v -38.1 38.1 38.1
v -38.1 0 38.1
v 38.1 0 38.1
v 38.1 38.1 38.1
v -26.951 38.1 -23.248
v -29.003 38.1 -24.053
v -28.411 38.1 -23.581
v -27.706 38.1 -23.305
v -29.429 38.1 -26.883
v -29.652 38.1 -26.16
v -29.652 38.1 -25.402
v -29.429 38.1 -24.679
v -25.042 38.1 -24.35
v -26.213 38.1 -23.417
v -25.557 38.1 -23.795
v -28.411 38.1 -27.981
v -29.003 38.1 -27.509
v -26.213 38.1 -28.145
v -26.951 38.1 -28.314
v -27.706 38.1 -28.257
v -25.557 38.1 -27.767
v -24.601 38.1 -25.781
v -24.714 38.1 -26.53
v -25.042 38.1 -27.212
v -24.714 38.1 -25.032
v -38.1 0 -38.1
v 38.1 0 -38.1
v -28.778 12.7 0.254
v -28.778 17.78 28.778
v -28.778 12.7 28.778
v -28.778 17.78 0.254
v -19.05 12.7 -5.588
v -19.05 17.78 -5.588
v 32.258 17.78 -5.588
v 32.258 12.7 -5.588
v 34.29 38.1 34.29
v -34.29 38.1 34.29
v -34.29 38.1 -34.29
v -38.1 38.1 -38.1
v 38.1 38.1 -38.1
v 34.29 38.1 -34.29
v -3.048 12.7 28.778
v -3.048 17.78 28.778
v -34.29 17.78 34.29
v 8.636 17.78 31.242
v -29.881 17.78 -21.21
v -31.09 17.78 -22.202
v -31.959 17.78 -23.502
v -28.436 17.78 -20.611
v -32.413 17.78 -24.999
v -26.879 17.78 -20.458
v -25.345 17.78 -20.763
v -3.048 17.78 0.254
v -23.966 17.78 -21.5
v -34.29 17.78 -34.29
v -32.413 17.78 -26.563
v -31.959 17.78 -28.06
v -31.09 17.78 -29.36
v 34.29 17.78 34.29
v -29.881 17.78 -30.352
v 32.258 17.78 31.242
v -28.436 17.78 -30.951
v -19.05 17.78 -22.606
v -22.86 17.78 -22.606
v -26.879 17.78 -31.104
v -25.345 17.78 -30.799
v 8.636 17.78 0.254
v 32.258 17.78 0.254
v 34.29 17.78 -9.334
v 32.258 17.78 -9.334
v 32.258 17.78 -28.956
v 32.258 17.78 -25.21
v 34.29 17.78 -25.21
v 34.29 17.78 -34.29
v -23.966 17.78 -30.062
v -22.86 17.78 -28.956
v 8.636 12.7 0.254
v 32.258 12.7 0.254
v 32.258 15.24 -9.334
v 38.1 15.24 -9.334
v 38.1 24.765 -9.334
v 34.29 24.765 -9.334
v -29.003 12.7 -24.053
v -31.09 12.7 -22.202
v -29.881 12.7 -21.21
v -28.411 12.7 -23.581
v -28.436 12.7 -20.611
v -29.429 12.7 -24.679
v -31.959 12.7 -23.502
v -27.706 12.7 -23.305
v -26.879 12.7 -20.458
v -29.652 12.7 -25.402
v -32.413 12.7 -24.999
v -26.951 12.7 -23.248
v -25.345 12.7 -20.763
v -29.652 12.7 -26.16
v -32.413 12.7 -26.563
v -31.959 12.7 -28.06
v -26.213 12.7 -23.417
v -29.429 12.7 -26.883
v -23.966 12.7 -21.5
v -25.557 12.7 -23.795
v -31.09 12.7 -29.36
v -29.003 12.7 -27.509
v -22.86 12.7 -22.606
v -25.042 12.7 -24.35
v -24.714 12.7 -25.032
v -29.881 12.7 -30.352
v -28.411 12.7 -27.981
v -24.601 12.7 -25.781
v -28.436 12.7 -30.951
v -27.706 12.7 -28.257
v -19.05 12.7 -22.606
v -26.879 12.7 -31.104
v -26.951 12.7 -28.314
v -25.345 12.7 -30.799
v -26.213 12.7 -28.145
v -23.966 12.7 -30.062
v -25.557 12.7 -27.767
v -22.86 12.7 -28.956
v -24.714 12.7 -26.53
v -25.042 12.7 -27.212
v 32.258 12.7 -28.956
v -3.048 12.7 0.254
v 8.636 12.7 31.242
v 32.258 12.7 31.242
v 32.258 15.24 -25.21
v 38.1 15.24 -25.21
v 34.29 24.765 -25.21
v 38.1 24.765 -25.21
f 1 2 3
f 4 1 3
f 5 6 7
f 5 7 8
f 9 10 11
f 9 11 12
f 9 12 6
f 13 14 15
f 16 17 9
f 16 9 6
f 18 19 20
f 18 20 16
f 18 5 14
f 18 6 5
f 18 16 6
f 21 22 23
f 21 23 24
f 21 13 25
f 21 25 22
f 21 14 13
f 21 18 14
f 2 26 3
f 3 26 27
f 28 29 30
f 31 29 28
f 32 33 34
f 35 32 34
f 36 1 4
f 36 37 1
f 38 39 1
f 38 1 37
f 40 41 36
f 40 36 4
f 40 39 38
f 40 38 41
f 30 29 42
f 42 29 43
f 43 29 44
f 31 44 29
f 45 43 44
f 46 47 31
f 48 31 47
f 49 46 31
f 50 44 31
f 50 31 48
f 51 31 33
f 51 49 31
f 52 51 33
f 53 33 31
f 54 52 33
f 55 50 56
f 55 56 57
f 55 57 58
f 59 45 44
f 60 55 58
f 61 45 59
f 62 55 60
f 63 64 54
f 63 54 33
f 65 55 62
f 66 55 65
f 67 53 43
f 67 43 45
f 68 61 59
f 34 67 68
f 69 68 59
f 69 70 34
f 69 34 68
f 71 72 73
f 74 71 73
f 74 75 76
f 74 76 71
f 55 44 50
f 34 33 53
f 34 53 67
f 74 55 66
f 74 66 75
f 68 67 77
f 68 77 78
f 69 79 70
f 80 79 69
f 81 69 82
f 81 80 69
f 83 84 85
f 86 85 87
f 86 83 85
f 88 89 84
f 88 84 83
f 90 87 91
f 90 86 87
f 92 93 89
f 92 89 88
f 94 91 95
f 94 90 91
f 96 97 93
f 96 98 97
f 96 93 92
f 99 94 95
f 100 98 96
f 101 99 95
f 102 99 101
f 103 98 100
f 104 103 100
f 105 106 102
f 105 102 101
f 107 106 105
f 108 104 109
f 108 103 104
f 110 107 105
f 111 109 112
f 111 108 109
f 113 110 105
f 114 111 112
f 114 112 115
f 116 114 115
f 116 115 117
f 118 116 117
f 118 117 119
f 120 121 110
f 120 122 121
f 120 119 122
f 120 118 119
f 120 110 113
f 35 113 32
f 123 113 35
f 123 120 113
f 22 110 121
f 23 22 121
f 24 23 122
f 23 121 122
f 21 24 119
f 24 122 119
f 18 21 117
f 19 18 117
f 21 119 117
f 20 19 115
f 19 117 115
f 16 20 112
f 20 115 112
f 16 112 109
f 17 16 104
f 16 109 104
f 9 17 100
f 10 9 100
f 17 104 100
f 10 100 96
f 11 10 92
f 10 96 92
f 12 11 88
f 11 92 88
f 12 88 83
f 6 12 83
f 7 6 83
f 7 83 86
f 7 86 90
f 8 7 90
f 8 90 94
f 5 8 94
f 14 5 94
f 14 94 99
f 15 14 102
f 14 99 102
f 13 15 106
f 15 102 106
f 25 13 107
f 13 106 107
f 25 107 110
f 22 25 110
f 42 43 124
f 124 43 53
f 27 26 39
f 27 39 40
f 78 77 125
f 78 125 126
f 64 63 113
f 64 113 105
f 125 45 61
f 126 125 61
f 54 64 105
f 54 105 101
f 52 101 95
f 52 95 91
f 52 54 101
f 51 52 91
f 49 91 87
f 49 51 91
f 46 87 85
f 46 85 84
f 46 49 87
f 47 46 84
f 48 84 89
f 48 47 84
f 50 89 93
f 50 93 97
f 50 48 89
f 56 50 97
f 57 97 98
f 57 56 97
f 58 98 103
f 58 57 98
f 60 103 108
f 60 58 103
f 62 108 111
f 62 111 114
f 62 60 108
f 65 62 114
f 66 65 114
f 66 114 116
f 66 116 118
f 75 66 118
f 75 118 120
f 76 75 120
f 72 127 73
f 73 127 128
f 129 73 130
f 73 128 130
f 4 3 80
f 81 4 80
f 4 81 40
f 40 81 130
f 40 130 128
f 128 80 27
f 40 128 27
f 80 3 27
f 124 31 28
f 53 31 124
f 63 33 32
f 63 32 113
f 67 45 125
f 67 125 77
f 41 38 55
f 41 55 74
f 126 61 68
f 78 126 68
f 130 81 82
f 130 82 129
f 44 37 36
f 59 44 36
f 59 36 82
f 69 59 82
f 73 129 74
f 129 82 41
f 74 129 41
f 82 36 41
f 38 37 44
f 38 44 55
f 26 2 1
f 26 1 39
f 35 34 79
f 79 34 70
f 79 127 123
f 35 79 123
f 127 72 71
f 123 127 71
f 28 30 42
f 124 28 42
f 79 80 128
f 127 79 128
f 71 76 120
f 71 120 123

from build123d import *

# Parameters (mm, degrees)
SKETCH1_W           = 76.2
SKETCH1_H           = 76.2
BOSS_EXTRUDE1_DEPTH = 38.1
SKETCH2_W           = 51.308
SKETCH2_H           = 23.368
SKETCH2_W_2         = 23.622
SKETCH2_H_2         = 30.988
SKETCH2_W_3         = 25.7302
SKETCH2_H_3         = 28.5242
CUT_EXTRUDE3_DEPTH  = 25.4
SKETCH8_W           = 68.58
SKETCH8_H           = 68.58
SKETCH8_W_2         = 25.7302
SKETCH8_H_2         = 28.5242
SKETCH8_W_3         = 23.622
SKETCH8_H_3         = 30.988
SKETCH8_W_4         = 51.308
SKETCH8_H_4         = 23.368
CUT_EXTRUDE5_DEPTH  = 20.32
SKETCH10_W          = 15.875
SKETCH10_H          = 9.525
CUT_EXTRUDE6_DEPTH  = 20.32
CUT_EXTRUDE7_DEPTH  = 5.08
SKETCH12_R          = 2.54
BOSS_EXTRUDE2_DEPTH = 25.4


with BuildPart() as part:
    # Sketch1 → Boss-Extrude1 (new body)
    with BuildSketch(Plane(origin=(0, 0, 0), x_dir=(1, 0, 0), z_dir=(0, 1, 0))):
        Rectangle(SKETCH1_W, SKETCH1_H)
    extrude(amount=BOSS_EXTRUDE1_DEPTH)

    # Sketch2 → Cut-Extrude3 (cut)
    with BuildSketch(Plane(origin=(0, 38.1, 0), x_dir=(1, 0, 0), z_dir=(0, 1, 0))):
        with Locations((6.604, 17.272)):
            Rectangle(SKETCH2_W, SKETCH2_H)
        with Locations((20.447, -15.748)):
            Rectangle(SKETCH2_W_2, SKETCH2_H_2)
        with Locations((-15.9131, -14.5161)):
            Rectangle(SKETCH2_W_3, SKETCH2_H_3)
    extrude(amount=-CUT_EXTRUDE3_DEPTH, mode=Mode.SUBTRACT)

    # Sketch8 → Cut-Extrude5 (cut)
    with BuildSketch(Plane(origin=(0, 38.1, 0), x_dir=(1, 0, 0), z_dir=(0, 1, 0))):
        Rectangle(SKETCH8_W, SKETCH8_H)
        with Locations((-15.9131, -14.5161)):
            Rectangle(SKETCH8_W_2, SKETCH8_H_2, mode=Mode.SUBTRACT)
        with Locations((20.447, -15.748)):
            Rectangle(SKETCH8_W_3, SKETCH8_H_3, mode=Mode.SUBTRACT)
        with Locations((6.604, 17.272)):
            Rectangle(SKETCH8_W_4, SKETCH8_H_4, mode=Mode.SUBTRACT)
    extrude(amount=-CUT_EXTRUDE5_DEPTH, mode=Mode.SUBTRACT)

    # Sketch10 → Cut-Extrude6 (cut)
    with BuildSketch(Plane(origin=(38.1, 0, 0), x_dir=(0, 0, -1), z_dir=(1, 0, 0))):
        with Locations((17.272, 20.0025)):
            Rectangle(SKETCH10_W, SKETCH10_H)
    extrude(amount=-CUT_EXTRUDE6_DEPTH, mode=Mode.SUBTRACT)

    # Sketch11 → Cut-Extrude7 (cut)
    with BuildSketch(Plane(origin=(0, 17.78, 0), x_dir=(1, 0, 0), z_dir=(0, 1, 0))):
        with BuildLine():
            Line((-19.05, 28.956), (-19.05, 22.606))
            Line((-19.05, 22.606), (-22.86, 22.606))
            ThreePointArc((-22.86, 22.606), (-32.470396483, 25.781), (-22.86, 28.956))
            Line((-22.86, 28.956), (-19.05, 28.956))
        make_face()
    extrude(amount=-CUT_EXTRUDE7_DEPTH, mode=Mode.SUBTRACT)

    # Sketch12 → Boss-Extrude2 (add)
    with BuildSketch(Plane(origin=(0, 12.7, 0), x_dir=(1, 0, 0), z_dir=(0, 1, 0))):
        with Locations((-27.140733667, 25.781)):
            Circle(SKETCH12_R)
    extrude(amount=BOSS_EXTRUDE2_DEPTH)


solid = part.part
